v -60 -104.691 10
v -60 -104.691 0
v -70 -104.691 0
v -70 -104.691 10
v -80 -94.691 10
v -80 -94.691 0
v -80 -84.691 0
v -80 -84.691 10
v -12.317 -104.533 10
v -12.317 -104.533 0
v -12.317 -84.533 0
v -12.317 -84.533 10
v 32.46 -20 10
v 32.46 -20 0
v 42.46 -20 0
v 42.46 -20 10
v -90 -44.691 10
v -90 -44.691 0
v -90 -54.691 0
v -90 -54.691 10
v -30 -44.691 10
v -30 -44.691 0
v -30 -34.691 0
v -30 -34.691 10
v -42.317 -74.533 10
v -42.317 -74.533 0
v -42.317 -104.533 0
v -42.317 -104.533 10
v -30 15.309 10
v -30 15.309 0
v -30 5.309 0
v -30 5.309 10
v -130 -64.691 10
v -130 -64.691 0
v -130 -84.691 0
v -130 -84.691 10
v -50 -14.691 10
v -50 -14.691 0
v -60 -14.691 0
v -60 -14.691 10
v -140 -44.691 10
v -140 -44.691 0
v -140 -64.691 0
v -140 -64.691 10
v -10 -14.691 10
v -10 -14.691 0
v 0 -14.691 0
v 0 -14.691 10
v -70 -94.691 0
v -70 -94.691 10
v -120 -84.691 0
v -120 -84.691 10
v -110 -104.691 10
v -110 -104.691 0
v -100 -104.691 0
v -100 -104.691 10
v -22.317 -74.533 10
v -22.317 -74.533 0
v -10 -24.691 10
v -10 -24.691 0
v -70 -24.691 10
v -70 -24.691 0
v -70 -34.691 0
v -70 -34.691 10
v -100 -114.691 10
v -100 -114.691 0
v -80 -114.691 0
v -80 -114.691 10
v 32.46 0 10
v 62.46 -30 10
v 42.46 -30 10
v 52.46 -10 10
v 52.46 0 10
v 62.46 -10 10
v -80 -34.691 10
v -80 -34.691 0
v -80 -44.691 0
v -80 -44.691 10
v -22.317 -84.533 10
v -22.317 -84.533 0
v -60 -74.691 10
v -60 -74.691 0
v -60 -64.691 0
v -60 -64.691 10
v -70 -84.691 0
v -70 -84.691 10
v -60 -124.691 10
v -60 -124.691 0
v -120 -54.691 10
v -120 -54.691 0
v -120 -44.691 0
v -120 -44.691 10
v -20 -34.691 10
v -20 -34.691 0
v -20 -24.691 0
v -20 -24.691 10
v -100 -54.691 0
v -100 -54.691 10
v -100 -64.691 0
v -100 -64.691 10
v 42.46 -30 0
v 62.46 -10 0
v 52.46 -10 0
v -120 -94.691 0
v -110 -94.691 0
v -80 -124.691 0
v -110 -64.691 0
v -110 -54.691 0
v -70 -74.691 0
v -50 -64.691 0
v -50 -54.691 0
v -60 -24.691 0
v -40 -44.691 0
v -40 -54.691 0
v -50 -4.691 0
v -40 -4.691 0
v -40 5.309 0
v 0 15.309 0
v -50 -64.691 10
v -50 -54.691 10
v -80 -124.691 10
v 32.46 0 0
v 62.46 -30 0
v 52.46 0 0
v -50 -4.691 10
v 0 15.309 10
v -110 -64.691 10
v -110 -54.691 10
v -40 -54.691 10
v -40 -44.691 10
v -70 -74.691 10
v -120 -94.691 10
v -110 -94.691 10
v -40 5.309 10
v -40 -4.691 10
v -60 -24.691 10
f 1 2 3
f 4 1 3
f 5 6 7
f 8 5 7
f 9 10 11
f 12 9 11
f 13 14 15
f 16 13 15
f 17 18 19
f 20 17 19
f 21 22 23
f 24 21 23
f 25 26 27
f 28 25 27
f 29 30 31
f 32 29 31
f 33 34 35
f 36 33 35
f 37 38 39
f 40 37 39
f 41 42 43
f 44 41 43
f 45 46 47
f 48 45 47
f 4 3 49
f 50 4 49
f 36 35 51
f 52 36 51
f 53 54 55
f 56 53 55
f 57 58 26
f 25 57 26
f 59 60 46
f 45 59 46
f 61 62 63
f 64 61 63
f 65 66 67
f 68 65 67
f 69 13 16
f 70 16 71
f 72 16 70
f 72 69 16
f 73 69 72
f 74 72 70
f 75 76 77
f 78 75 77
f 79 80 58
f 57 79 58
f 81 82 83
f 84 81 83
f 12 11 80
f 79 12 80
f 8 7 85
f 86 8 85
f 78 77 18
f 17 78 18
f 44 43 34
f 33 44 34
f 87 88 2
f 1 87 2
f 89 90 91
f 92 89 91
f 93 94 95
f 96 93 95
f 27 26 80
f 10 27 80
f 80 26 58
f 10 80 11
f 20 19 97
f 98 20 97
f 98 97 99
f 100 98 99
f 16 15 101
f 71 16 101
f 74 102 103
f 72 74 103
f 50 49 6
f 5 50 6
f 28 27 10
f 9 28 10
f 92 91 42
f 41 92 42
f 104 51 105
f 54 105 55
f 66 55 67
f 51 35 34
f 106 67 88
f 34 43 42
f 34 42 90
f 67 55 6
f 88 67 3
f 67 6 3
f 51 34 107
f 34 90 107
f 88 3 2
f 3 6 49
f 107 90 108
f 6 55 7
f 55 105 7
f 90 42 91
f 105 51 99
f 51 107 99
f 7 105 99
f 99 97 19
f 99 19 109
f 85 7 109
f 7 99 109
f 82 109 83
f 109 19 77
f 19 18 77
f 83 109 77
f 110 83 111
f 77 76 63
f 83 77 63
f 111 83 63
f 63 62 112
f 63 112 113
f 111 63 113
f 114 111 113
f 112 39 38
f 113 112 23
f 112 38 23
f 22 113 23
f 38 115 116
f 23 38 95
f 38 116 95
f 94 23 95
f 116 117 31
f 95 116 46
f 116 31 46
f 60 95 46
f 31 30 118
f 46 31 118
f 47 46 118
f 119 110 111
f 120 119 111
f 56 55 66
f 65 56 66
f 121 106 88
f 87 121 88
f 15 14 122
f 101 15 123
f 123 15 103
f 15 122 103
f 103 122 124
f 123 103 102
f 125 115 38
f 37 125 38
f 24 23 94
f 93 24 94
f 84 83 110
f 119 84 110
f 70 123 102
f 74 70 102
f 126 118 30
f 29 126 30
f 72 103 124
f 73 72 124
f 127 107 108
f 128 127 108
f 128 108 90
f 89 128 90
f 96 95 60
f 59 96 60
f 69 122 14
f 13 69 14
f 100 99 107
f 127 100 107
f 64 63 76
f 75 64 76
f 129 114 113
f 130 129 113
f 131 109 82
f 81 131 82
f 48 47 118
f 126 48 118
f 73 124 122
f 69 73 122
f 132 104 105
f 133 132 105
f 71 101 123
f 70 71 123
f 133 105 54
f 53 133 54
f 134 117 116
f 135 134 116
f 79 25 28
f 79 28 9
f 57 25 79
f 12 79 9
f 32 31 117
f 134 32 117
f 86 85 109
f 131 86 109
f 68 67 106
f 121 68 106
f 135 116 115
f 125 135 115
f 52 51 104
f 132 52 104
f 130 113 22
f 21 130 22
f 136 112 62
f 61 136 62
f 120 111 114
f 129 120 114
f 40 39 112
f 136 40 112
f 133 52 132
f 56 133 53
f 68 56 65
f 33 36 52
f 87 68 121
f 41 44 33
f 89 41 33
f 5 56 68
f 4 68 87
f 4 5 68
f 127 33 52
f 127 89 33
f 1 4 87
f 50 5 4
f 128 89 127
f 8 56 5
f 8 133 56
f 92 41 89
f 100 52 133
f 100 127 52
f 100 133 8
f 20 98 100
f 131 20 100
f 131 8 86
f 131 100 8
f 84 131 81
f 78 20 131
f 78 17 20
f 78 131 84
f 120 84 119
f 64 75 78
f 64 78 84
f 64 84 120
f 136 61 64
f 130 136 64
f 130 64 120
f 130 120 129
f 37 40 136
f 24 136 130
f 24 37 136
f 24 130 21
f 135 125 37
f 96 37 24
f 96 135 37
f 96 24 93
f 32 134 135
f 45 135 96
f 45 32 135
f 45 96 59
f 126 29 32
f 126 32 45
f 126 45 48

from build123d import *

# Parameters (mm, degrees)
F1_DEPTH = 10


with BuildPart() as f1:
    # F0 (on Top) → F1 (new body)
    with BuildSketch(Plane.XY):
        Polygon((0, -14.691349), (0, 15.308651), (-30, 15.308651), (-30, 5.308651), (-40, 5.308651), (-40, -4.691349), (-50, -4.691349), (-50, -14.691349), (-60, -14.691349), (-60, -24.691349), (-70, -24.691349), (-70, -34.691349), (-80, -34.691349), (-80, -44.691349), (-90, -44.691349), (-90, -54.691349), (-100, -54.691349), (-100, -64.691349), (-110, -64.691349), (-110, -54.691349), (-120, -54.691349), (-120, -44.691349), (-140, -44.691349), (-140, -64.691349), (-130, -64.691349), (-130, -84.691349), (-120, -84.691349), (-120, -94.691349), (-110, -94.691349), (-110, -104.691349), (-100, -104.691349), (-100, -114.691349), (-80, -114.691349), (-80, -124.691349), (-60, -124.691349), (-60, -104.691349), (-70, -104.691349), (-70, -94.691349), (-80, -94.691349), (-80, -84.691349), (-70, -84.691349), (-70, -74.691349), (-60, -74.691349), (-60, -64.691349), (-50, -64.691349), (-50, -54.691349), (-40, -54.691349), (-40, -44.691349), (-30, -44.691349), (-30, -34.691349), (-20, -34.691349), (-20, -24.691349), (-10, -24.691349), (-10, -14.691349), align=None)
        Polygon((-22.316854, -74.532531), (-42.316854, -74.532531), (-42.316854, -104.532531), (-12.316854, -104.532531), (-12.316854, -84.532531), (-22.316854, -84.532531), align=None)
        Polygon((52.460153, 0), (32.460153, 0), (32.460153, -20), (42.460153, -20), (42.460153, -30), (62.460153, -30), (62.460153, -10), (52.460153, -10), align=None)
    extrude(amount=F1_DEPTH)


solid = f1.part
